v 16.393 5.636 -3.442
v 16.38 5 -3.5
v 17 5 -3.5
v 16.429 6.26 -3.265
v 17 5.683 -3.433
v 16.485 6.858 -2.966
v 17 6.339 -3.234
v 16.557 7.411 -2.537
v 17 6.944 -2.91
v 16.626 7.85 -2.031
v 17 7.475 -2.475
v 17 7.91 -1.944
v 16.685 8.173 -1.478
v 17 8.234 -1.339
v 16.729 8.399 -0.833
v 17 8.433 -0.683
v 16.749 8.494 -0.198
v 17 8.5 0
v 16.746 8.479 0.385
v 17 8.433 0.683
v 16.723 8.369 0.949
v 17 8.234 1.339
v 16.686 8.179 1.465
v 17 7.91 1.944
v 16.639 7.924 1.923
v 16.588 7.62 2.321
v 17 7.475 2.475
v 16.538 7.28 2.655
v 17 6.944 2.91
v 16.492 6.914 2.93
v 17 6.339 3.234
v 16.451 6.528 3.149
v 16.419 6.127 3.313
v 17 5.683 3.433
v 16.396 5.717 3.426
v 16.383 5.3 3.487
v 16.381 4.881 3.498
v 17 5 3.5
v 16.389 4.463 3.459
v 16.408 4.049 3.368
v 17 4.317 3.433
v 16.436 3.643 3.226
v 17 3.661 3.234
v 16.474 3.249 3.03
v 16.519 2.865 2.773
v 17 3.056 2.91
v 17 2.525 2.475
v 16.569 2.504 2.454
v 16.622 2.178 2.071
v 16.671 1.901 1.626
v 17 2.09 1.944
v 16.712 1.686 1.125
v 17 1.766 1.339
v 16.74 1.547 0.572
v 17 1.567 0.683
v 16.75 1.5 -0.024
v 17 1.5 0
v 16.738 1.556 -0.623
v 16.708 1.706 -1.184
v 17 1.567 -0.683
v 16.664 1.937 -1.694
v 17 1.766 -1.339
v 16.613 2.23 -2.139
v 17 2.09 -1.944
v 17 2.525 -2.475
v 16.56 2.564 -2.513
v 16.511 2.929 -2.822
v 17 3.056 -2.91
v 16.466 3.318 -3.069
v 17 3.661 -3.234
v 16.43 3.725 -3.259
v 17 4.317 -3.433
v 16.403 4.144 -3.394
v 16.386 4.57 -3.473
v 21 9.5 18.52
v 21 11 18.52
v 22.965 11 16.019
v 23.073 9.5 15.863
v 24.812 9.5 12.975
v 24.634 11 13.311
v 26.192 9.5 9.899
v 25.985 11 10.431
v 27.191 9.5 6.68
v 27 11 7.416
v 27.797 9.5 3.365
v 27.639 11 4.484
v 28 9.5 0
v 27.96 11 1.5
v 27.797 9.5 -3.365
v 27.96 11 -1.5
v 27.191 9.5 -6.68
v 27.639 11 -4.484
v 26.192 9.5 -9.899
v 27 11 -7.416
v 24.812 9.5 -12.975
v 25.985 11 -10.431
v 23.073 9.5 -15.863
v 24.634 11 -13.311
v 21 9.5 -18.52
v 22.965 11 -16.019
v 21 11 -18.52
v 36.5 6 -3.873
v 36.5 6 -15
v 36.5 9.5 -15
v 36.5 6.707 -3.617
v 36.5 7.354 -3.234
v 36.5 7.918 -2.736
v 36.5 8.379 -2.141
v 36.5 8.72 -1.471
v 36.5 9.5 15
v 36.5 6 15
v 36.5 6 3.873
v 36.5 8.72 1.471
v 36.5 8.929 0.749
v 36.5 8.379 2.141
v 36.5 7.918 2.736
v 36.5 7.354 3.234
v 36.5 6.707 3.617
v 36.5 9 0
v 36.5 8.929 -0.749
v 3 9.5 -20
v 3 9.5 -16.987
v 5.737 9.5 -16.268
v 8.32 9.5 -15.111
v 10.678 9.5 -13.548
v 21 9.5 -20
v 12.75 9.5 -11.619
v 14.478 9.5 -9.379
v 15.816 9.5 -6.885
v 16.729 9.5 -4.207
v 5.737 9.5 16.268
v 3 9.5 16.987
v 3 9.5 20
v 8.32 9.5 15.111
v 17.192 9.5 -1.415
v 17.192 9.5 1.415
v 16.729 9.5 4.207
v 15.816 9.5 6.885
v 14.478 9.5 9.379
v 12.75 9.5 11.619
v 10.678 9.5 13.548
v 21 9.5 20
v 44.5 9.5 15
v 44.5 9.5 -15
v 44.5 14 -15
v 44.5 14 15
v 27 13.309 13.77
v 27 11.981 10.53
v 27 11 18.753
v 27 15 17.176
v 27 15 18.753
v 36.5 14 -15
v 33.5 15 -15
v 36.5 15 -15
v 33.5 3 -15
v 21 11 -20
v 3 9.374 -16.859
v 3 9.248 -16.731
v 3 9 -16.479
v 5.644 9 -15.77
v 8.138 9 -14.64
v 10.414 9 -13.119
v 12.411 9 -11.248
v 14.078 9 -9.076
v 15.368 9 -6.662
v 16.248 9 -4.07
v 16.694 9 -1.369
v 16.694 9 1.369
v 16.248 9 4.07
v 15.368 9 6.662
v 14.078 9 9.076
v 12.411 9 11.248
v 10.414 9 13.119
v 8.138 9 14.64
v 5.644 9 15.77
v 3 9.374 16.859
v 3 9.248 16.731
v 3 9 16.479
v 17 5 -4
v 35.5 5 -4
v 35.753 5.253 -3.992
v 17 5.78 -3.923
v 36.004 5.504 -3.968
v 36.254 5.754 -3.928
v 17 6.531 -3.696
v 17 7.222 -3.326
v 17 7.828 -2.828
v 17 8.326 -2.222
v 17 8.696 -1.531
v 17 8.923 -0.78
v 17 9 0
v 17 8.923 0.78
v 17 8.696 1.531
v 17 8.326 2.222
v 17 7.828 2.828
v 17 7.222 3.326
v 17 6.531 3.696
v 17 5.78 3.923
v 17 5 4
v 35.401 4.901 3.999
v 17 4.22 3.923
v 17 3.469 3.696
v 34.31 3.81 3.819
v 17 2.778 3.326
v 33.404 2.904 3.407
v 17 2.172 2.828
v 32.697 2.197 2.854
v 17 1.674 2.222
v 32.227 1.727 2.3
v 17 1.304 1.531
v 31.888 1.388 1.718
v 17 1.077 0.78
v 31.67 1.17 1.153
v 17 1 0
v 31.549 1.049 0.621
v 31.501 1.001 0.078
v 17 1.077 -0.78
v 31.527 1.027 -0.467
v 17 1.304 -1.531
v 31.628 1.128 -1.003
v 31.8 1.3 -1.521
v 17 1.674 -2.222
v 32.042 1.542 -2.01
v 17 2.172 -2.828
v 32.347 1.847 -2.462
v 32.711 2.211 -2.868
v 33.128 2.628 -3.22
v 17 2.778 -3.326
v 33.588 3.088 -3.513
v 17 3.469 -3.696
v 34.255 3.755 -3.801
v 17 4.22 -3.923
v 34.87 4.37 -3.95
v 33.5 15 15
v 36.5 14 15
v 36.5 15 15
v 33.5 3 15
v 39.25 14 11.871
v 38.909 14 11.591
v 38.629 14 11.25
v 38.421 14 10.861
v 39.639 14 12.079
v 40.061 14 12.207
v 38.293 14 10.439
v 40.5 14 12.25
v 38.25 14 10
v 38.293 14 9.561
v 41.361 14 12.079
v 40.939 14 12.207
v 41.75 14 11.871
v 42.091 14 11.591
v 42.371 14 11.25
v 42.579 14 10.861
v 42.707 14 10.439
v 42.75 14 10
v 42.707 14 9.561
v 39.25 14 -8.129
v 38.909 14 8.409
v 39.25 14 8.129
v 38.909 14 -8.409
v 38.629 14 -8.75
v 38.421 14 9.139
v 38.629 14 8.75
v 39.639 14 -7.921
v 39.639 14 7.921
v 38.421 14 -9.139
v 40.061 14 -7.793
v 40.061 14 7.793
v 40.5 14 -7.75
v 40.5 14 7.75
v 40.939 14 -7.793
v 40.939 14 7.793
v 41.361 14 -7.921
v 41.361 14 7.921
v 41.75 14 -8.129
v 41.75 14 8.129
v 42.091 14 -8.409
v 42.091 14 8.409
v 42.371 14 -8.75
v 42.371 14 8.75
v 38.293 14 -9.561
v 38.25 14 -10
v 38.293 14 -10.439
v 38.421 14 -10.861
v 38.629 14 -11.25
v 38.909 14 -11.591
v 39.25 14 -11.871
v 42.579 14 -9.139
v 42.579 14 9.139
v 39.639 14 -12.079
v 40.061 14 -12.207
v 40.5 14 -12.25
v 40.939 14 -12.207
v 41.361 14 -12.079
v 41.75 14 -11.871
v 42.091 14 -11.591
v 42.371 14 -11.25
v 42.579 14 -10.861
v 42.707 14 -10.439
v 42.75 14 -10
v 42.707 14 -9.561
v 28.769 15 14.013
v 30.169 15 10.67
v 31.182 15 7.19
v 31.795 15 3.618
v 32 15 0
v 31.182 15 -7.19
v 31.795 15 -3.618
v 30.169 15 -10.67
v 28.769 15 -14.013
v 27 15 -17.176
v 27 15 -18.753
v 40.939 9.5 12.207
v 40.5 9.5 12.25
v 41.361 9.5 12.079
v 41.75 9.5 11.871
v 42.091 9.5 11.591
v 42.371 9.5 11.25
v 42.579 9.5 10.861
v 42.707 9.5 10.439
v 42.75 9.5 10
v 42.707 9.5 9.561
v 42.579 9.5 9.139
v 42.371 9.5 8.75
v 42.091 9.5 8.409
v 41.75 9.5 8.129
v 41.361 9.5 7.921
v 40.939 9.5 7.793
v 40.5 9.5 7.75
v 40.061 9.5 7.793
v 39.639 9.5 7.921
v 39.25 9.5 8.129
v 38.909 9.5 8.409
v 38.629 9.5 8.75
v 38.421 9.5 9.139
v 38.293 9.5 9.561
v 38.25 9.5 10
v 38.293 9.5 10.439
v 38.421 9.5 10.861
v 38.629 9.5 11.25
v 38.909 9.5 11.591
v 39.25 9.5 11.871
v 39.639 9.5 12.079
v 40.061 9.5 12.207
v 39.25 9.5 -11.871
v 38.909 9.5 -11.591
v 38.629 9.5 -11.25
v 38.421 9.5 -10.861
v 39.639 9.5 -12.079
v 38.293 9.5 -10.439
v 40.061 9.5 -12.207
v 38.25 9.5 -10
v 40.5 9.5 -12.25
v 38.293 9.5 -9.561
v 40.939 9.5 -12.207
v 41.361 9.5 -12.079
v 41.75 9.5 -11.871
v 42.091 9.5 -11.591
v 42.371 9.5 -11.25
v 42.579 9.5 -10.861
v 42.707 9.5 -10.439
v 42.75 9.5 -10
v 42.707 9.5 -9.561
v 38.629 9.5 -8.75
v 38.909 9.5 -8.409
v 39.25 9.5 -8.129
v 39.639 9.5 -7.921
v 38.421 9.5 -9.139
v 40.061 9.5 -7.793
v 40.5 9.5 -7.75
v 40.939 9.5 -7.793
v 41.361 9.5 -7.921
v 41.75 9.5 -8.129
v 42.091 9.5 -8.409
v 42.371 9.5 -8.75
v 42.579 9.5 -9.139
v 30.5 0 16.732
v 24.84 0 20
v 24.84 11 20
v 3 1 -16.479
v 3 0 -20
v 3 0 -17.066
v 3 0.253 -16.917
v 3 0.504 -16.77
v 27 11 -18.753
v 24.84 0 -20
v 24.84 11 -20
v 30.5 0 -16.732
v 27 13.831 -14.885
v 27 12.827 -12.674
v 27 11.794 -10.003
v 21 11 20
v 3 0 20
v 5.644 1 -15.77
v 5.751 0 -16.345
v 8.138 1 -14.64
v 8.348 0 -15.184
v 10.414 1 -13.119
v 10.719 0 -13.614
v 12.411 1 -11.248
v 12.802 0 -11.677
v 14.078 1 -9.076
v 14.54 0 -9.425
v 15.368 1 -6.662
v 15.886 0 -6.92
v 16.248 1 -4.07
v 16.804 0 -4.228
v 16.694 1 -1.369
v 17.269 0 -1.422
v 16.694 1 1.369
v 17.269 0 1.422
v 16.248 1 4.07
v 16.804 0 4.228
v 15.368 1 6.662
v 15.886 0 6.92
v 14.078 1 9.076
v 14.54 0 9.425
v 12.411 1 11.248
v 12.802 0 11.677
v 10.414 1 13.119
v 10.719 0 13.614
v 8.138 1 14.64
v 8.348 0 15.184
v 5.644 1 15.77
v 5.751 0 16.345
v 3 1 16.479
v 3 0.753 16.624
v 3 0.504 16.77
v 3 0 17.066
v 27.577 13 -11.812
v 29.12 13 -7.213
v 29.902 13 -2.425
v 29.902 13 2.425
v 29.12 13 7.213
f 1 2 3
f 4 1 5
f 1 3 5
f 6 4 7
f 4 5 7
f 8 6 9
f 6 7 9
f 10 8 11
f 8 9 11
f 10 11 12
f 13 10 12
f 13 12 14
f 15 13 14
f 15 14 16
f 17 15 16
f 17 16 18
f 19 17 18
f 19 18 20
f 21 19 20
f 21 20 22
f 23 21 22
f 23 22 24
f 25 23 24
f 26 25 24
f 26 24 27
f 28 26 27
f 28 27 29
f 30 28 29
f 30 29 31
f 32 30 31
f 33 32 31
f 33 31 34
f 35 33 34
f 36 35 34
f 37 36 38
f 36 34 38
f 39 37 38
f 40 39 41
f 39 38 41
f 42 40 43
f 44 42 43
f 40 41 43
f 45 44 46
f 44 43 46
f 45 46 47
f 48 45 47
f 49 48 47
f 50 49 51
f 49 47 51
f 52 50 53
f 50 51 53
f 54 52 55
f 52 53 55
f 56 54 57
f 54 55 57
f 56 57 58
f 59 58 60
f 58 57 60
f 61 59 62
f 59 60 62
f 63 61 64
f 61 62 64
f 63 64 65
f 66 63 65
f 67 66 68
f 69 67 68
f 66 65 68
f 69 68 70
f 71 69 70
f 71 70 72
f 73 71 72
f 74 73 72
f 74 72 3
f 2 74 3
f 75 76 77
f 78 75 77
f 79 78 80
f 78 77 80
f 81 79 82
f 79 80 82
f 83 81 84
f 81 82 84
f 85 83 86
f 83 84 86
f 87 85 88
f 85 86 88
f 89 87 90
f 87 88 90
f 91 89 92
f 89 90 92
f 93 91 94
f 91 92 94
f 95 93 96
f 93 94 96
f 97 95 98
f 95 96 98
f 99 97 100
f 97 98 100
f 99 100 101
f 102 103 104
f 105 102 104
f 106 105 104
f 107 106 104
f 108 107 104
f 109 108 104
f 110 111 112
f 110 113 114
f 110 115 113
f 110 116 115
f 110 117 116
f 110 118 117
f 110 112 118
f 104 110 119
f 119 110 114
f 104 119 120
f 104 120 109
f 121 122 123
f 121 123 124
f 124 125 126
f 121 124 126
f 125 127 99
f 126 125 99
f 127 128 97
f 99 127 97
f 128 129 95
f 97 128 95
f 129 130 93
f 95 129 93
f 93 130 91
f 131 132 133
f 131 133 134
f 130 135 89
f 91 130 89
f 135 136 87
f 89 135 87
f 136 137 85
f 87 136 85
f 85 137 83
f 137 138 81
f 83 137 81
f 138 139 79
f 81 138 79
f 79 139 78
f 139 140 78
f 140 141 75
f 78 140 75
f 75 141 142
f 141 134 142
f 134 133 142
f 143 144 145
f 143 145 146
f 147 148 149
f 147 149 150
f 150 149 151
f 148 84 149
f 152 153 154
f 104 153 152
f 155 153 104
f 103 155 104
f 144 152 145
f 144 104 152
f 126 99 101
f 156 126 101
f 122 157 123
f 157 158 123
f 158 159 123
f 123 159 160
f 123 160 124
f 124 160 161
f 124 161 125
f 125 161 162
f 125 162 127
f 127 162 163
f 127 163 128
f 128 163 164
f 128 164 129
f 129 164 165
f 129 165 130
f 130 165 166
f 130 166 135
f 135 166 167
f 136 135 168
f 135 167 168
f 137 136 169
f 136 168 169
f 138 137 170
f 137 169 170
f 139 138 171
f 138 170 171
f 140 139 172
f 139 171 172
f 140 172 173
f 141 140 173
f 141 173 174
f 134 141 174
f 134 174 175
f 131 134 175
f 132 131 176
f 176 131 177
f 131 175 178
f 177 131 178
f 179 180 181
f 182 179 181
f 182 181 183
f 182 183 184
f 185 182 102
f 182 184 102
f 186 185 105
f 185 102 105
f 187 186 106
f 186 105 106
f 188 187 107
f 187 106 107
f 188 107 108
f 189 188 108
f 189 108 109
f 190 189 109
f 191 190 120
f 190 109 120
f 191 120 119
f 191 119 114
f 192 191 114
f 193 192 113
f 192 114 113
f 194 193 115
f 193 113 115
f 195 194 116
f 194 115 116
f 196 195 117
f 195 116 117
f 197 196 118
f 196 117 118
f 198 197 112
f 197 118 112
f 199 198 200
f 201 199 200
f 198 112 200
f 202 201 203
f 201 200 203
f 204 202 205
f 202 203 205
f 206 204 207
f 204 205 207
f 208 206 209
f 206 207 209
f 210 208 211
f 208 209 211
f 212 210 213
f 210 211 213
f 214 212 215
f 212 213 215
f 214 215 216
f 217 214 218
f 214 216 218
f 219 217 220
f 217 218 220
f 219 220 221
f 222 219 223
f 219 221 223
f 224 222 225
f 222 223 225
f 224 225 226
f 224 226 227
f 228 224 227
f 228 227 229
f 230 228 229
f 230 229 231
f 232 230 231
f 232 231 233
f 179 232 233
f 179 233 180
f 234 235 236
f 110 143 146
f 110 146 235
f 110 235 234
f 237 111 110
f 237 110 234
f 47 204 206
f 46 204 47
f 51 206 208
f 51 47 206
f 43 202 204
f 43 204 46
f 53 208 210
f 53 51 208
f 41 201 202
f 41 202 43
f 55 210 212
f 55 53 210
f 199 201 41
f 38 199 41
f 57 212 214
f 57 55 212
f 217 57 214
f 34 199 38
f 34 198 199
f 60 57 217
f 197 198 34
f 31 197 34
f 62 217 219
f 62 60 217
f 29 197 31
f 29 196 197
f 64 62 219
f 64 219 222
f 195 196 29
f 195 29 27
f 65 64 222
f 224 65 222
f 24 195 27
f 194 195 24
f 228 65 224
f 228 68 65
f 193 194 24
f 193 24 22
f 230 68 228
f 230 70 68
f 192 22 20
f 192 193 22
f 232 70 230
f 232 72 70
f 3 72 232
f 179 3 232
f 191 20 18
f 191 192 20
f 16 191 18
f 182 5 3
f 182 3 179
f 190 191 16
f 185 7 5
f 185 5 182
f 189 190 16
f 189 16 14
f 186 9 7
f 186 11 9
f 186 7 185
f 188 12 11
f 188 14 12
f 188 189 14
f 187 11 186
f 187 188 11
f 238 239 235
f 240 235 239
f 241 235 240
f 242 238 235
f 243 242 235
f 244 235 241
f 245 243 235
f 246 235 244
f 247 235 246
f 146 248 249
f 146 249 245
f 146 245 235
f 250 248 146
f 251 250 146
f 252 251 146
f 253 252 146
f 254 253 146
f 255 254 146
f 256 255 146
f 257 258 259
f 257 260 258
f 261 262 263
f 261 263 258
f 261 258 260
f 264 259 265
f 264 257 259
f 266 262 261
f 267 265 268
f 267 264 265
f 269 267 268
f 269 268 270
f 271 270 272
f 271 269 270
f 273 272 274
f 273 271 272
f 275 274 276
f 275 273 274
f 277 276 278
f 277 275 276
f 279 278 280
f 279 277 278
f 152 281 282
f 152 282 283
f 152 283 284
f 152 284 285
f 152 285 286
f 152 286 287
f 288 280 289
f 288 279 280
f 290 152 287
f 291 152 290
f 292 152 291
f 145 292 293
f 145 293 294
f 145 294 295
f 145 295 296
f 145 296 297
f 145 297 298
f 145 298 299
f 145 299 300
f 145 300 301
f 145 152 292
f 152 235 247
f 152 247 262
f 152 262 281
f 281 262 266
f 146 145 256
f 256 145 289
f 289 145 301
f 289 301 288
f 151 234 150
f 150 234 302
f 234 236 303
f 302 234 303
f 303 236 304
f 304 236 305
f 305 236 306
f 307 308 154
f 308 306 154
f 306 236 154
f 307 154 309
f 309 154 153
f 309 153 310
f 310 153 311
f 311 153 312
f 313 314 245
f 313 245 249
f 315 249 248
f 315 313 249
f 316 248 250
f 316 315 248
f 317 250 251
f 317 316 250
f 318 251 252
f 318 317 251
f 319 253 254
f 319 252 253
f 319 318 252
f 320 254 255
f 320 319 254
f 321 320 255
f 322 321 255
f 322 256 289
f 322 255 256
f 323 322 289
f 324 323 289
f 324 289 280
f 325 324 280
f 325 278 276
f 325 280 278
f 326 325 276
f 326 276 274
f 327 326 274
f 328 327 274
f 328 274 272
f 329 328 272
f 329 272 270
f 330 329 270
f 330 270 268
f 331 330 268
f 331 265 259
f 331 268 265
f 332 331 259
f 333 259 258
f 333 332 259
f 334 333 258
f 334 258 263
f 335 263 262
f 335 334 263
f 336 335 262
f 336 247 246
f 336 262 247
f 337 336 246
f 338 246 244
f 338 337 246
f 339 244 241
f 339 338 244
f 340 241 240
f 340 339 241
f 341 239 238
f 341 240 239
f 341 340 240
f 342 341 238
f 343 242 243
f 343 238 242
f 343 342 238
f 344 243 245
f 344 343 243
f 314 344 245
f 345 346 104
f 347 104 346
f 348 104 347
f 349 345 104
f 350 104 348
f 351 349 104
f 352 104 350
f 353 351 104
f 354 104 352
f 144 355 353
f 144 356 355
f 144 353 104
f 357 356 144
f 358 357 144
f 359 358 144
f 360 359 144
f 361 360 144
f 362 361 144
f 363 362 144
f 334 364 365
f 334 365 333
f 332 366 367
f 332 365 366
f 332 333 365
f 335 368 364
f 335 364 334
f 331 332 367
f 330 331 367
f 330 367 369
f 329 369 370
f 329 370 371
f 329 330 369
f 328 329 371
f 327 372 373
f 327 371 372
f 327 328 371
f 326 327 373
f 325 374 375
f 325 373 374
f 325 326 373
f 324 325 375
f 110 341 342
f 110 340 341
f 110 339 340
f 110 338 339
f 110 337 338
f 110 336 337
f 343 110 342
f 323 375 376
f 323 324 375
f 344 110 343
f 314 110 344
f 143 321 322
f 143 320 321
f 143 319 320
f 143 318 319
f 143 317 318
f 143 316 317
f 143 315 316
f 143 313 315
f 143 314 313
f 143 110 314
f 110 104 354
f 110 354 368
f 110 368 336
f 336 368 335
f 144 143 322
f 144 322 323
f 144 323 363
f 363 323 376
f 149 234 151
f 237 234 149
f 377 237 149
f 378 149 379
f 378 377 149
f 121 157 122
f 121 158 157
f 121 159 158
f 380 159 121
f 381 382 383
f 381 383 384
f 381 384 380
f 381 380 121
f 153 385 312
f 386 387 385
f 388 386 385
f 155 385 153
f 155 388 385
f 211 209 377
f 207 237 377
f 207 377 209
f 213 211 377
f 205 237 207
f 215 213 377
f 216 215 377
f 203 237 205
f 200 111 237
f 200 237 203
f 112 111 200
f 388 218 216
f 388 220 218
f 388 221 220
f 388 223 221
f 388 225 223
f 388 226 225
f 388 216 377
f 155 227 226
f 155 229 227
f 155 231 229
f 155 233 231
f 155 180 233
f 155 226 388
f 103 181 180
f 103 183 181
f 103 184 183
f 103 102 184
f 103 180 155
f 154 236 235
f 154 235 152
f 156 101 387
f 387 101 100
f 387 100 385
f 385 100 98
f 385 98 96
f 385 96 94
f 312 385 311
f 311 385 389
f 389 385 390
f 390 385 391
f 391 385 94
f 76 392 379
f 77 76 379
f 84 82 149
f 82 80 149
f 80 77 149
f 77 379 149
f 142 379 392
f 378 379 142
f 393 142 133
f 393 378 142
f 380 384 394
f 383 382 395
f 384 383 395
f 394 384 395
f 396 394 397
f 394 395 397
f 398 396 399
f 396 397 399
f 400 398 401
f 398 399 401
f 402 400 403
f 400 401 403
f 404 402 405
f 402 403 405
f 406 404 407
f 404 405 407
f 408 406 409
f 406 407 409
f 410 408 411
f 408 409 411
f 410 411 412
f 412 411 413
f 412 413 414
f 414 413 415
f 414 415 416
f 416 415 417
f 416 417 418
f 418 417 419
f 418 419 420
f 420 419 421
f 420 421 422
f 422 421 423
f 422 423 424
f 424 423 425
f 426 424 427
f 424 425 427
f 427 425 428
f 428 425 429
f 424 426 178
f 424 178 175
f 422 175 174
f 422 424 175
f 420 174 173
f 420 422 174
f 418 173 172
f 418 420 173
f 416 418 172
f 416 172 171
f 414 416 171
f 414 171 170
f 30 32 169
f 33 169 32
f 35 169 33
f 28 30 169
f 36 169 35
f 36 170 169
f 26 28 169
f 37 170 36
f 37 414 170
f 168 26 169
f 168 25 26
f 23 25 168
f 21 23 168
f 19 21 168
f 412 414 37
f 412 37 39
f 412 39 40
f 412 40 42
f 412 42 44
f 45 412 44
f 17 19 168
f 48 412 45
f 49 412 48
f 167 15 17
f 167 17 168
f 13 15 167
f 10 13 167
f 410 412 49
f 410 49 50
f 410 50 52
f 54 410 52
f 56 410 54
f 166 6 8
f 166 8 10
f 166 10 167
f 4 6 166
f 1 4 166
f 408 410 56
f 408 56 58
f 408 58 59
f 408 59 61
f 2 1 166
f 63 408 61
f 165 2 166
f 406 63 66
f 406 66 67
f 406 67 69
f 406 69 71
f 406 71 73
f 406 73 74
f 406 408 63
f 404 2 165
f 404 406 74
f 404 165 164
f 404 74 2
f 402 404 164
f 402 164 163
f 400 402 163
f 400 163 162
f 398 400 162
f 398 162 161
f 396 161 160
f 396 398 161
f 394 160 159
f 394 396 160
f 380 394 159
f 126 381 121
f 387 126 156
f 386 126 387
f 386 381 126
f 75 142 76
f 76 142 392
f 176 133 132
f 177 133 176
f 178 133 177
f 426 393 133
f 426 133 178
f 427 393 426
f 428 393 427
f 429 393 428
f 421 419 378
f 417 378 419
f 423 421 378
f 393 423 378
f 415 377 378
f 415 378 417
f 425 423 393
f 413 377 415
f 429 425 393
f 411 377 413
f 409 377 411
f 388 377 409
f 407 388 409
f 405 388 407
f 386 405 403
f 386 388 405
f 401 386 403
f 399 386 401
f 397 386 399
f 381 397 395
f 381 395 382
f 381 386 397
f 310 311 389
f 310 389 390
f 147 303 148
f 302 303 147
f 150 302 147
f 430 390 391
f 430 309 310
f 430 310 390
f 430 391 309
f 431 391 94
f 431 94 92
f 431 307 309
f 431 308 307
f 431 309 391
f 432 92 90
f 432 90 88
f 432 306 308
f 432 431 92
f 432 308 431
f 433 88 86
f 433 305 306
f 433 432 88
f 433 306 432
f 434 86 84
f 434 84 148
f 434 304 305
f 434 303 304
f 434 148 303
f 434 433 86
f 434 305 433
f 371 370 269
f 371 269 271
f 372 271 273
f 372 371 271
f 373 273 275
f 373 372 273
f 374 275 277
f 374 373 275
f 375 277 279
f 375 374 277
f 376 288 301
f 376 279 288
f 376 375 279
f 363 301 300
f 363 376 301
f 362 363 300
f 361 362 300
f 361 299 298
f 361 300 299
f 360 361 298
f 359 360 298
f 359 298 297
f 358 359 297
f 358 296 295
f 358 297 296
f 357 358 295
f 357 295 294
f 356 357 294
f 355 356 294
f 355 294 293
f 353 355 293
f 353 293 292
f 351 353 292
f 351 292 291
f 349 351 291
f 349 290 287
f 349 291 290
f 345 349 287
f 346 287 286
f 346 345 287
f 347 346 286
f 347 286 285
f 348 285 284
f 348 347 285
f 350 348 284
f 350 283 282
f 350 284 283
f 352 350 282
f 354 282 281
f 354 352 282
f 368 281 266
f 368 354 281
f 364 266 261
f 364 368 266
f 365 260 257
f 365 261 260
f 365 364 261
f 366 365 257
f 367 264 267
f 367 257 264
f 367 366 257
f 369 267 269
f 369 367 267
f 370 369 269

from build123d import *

# Parameters (mm, degrees)
CROQUIS1_R              = 2.25
SALIENTE_EXTRUIR2_DEPTH = 15
CROQUIS2_W              = 8
CROQUIS2_H              = 30
CORTAR_EXTRUIR1_DEPTH   = 1
CROQUIS5_R              = 28
CORTAR_EXTRUIR2_DEPTH   = 5.5
CHAFL_N1_SIZE           = 4
CROQUIS6_W              = 27
CROQUIS6_H              = 4
CORTAR_EXTRUIR3_DEPTH   = 62.686708544
CROQUIS7_W              = 21
CROQUIS7_H              = 1.5
CORTAR_EXTRUIR4_DEPTH   = 62.686708455
CORTAR_EXTRUIR5_REACH   = 60.568
CROQUIS8_W              = 8
CROQUIS8_H              = 9.5
CHAFL_N2_SIZE           = 6
CHAFL_N3_SIZE           = 0.5
CROQUIS9_R              = 3.5
CORTAR_EXTRUIR6_DEPTH   = 42.800119617
CROQUIS10_R             = 4
CORTAR_EXTRUIR7_DEPTH   = 19.5


with BuildPart() as part:
    # Croquis1 → Saliente-Extruir2 (new body)
    with BuildSketch(Plane(origin=(0, 0, 0), x_dir=(1, 0, 0), z_dir=(0, 1, 0))):
        with BuildLine():
            Line((3, 20), (24.839745962, 20))
            Line((24.839745962, 20), (33.5, 15))
            Line((33.5, 15), (44.5, 15))
            Line((44.5, 15), (44.5, -15))
            Line((44.5, -15), (33.5, -15))
            Line((33.5, -15), (24.839745962, -20))
            Line((24.839745962, -20), (3, -20))
            Line((3, -20), (3, -16.479153498))
            ThreePointArc((3, -16.479153498), (16.75, 0), (3, 16.479153498))
            Line((3, 16.479153498), (3, 20))
        make_face()
        with Locations(Location((40.5, 10, 0), (0, 0, 270))):
            Circle(CROQUIS1_R, mode=Mode.SUBTRACT)
        with Locations(Location((40.5, -10, 0), (0, 0, 270))):
            Circle(CROQUIS1_R, mode=Mode.SUBTRACT)
    extrude(amount=SALIENTE_EXTRUIR2_DEPTH)

    # Croquis2 → Cortar-Extruir1 (cut)
    with BuildSketch(Plane(origin=(0, 15, 0), x_dir=(1, 0, 0), z_dir=(0, 1, 0))):
        with Locations((40.5, 0)):
            Rectangle(CROQUIS2_W, CROQUIS2_H)
    extrude(amount=-CORTAR_EXTRUIR1_DEPTH, mode=Mode.SUBTRACT)

    # Croquis3 → Cortar-Revolución1 (revolve, cut)
    with BuildSketch(Plane.XY):
        Polygon((16.75, 0), (16.75, 1), (17.327350269, 0), align=None)
    revolve(axis=Axis((0, 15, 0), (0, -1, 0)), mode=Mode.SUBTRACT)

    # Croquis5 → Cortar-Extruir2 (cut)
    with BuildSketch(Plane(origin=(0, 15, 0), x_dir=(1, 0, 0), z_dir=(0, 1, 0))):
        Circle(CROQUIS5_R)
    extrude(amount=-CORTAR_EXTRUIR2_DEPTH, mode=Mode.SUBTRACT)

    # Chaflán1
    chafl_n1_edges = [part.edges().sort_by_distance(p)[0] for p in [
        (28, 15, 0),
    ]]
    chamfer(chafl_n1_edges, length=CHAFL_N1_SIZE)

    # Croquis6 → Cortar-Extruir3 (cut, through all)
    with BuildSketch(Plane.XY.offset(20)):
        with Locations((13.5, 13)):
            Rectangle(CROQUIS6_W, CROQUIS6_H)
    extrude(amount=-CORTAR_EXTRUIR3_DEPTH, mode=Mode.SUBTRACT)

    # Croquis7 → Cortar-Extruir4 (cut, through all)
    with BuildSketch(Plane.XY.offset(20)):
        with Locations((10.5, 10.25)):
            Rectangle(CROQUIS7_W, CROQUIS7_H)
    extrude(amount=-CORTAR_EXTRUIR4_DEPTH, mode=Mode.SUBTRACT)

    # Croquis8 → Cortar-Extruir5 (cut, up to next)
    with BuildSketch(Plane.XY.offset(15), mode=Mode.PRIVATE) as cortar_extruir5_sk1:
        with Locations((40.5, 4.75)):
            Rectangle(CROQUIS8_W, CROQUIS8_H)
    cortar_extruir5_tool1 = extrude(cortar_extruir5_sk1.sketch, amount=-CORTAR_EXTRUIR5_REACH, mode=Mode.PRIVATE) & part.part
    add(cortar_extruir5_tool1.solids().sort_by_distance((40.5, 4.75, 15))[0], mode=Mode.SUBTRACT)

    # Chaflán2
    chafl_n2_edges = [part.edges().sort_by_distance(p)[0] for p in [
        (36.5, 0, 0),
    ]]
    chamfer(chafl_n2_edges, length=CHAFL_N2_SIZE)

    # Chaflán3
    chafl_n3_edges = [part.edges().sort_by_distance(p)[0] for p in [
        (16.75, 9.5, 0),
    ]]
    chamfer(chafl_n3_edges, length=CHAFL_N3_SIZE)

    # Croquis9 → Cortar-Extruir6 (cut, through all)
    with BuildSketch(Plane(origin=(36.5, 0, 0), x_dir=(0, 0, -1), z_dir=(1, 0, 0))):
        with Locations((0, 5)):
            Circle(CROQUIS9_R)
    extrude(amount=-CORTAR_EXTRUIR6_DEPTH, mode=Mode.SUBTRACT)

    # Croquis10 → Cortar-Extruir7 (cut)
    with BuildSketch(Plane(origin=(36.5, 0, 0), x_dir=(0, 0, -1), z_dir=(1, 0, 0))):
        with Locations((0, 5)):
            Circle(CROQUIS10_R)
    extrude(amount=-CORTAR_EXTRUIR7_DEPTH, mode=Mode.SUBTRACT)


solid = part.part
